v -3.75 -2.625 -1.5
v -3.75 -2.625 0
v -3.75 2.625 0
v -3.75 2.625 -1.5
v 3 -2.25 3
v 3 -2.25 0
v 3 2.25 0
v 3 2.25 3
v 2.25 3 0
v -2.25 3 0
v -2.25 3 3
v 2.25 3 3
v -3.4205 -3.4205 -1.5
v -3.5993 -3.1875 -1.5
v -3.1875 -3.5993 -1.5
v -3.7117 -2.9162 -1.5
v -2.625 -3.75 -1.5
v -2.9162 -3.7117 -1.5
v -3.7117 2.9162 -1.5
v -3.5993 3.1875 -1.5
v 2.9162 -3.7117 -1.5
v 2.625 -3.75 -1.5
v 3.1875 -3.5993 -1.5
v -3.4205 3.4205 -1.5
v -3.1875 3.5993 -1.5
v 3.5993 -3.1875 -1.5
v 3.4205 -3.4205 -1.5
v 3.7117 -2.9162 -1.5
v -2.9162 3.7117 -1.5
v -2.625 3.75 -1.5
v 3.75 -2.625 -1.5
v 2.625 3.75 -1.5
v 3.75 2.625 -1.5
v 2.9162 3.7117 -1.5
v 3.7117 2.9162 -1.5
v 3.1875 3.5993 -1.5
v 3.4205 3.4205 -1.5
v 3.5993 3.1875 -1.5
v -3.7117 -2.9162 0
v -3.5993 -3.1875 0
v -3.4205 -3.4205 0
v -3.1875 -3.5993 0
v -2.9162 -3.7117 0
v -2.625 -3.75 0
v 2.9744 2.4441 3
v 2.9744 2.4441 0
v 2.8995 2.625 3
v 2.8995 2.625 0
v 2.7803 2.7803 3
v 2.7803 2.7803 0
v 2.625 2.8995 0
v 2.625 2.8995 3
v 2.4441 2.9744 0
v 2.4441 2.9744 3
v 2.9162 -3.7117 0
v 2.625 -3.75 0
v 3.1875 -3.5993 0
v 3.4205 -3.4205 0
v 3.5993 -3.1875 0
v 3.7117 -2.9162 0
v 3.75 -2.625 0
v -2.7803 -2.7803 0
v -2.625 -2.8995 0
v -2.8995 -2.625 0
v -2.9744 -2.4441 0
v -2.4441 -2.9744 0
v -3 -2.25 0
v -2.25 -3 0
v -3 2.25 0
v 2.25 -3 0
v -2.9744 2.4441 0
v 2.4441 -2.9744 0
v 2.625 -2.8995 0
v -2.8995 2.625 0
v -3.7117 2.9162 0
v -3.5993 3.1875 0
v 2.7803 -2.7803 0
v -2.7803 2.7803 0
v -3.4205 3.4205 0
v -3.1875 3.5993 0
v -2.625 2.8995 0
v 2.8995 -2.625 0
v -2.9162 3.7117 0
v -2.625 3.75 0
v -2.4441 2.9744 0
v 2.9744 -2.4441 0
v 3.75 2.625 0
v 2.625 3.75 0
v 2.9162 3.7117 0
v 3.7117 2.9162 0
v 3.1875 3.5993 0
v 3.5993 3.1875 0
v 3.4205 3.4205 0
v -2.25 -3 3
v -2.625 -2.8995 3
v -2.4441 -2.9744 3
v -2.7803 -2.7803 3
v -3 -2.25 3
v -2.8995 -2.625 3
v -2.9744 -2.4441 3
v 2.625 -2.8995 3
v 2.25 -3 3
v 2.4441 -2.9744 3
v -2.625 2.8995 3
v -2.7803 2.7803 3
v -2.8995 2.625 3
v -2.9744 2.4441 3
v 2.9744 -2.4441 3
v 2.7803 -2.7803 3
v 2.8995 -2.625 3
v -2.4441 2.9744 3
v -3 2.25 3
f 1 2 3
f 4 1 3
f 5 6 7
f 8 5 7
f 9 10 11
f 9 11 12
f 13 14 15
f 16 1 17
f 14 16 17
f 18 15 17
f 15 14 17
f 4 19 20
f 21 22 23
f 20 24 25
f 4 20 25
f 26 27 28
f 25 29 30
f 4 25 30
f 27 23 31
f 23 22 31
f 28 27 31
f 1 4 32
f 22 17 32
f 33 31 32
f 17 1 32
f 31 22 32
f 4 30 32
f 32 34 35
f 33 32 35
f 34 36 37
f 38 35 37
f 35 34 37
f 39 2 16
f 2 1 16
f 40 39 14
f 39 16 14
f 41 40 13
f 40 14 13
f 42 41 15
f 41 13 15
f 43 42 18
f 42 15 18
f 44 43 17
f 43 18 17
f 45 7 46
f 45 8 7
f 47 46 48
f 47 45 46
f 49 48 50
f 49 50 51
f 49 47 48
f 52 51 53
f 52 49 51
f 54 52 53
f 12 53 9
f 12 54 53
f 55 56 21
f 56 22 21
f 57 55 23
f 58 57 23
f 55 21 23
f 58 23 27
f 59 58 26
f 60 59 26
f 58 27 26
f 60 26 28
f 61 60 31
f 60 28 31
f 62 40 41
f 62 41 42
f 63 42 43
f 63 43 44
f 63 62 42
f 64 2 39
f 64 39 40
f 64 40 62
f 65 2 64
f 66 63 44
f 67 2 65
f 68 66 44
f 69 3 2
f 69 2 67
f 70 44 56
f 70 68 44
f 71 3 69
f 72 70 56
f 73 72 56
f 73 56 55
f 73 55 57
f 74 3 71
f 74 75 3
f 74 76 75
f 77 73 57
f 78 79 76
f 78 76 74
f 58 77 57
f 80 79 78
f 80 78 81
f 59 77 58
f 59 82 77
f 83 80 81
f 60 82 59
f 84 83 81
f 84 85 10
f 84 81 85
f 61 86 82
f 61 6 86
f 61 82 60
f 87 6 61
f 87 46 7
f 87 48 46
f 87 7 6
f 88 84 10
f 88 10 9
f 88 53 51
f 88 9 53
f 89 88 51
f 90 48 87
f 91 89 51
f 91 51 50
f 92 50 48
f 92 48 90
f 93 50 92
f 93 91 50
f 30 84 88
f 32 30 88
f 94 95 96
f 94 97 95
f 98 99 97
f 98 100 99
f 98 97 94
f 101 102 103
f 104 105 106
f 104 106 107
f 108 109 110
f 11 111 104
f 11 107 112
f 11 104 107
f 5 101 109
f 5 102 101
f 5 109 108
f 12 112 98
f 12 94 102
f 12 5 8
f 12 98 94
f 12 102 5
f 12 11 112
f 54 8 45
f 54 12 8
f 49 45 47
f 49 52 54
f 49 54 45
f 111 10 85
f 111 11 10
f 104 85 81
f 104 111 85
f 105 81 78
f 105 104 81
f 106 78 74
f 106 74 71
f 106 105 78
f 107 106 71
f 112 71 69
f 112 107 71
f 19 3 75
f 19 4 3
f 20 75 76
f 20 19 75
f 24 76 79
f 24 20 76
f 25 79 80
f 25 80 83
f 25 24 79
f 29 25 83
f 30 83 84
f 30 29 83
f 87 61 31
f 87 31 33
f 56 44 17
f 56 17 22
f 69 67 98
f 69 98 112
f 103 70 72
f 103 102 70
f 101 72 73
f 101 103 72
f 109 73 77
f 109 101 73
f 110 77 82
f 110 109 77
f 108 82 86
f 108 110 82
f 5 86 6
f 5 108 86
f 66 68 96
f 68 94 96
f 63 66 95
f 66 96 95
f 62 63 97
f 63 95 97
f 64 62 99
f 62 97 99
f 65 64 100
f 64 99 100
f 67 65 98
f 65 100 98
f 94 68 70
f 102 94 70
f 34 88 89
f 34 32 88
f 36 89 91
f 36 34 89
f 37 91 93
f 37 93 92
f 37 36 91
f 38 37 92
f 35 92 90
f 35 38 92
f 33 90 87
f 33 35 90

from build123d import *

# Parameters (mm, degrees)
SKETCH_W     = 6
SKETCH_H     = 6
PAD_DEPTH    = 3
SKETCH001_W  = 7.5
SKETCH001_H  = 7.5
PAD001_DEPTH = 1.5
FILLET_R     = 1.125
FILLET001_R  = 0.75


with BuildPart() as part:
    # Sketch → Pad (new body)
    with BuildSketch(Plane.XY):
        Rectangle(SKETCH_W, SKETCH_H)
    extrude(amount=PAD_DEPTH)

    # Sketch001 → Pad001 (join)
    with BuildSketch(Plane.XY):
        Rectangle(SKETCH001_W, SKETCH001_H)
    extrude(amount=-PAD001_DEPTH)

    # Fillet
    fillet_edges = [part.edges().sort_by_distance(p)[0] for p in [
        (3.75, -3.75, -0.75),
        (3.75, 3.75, -0.75),
        (-3.75, 3.75, -0.75),
        (-3.75, -3.75, -0.75),
    ]]
    fillet(fillet_edges, radius=FILLET_R)

    # Fillet001
    fillet001_edges = [part.edges().sort_by_distance(p)[0] for p in [
        (3, -3, 1.5),
        (3, 3, 1.5),
        (-3, 3, 1.5),
        (-3, -3, 1.5),
    ]]
    fillet(fillet001_edges, radius=FILLET001_R)


solid = part.part
